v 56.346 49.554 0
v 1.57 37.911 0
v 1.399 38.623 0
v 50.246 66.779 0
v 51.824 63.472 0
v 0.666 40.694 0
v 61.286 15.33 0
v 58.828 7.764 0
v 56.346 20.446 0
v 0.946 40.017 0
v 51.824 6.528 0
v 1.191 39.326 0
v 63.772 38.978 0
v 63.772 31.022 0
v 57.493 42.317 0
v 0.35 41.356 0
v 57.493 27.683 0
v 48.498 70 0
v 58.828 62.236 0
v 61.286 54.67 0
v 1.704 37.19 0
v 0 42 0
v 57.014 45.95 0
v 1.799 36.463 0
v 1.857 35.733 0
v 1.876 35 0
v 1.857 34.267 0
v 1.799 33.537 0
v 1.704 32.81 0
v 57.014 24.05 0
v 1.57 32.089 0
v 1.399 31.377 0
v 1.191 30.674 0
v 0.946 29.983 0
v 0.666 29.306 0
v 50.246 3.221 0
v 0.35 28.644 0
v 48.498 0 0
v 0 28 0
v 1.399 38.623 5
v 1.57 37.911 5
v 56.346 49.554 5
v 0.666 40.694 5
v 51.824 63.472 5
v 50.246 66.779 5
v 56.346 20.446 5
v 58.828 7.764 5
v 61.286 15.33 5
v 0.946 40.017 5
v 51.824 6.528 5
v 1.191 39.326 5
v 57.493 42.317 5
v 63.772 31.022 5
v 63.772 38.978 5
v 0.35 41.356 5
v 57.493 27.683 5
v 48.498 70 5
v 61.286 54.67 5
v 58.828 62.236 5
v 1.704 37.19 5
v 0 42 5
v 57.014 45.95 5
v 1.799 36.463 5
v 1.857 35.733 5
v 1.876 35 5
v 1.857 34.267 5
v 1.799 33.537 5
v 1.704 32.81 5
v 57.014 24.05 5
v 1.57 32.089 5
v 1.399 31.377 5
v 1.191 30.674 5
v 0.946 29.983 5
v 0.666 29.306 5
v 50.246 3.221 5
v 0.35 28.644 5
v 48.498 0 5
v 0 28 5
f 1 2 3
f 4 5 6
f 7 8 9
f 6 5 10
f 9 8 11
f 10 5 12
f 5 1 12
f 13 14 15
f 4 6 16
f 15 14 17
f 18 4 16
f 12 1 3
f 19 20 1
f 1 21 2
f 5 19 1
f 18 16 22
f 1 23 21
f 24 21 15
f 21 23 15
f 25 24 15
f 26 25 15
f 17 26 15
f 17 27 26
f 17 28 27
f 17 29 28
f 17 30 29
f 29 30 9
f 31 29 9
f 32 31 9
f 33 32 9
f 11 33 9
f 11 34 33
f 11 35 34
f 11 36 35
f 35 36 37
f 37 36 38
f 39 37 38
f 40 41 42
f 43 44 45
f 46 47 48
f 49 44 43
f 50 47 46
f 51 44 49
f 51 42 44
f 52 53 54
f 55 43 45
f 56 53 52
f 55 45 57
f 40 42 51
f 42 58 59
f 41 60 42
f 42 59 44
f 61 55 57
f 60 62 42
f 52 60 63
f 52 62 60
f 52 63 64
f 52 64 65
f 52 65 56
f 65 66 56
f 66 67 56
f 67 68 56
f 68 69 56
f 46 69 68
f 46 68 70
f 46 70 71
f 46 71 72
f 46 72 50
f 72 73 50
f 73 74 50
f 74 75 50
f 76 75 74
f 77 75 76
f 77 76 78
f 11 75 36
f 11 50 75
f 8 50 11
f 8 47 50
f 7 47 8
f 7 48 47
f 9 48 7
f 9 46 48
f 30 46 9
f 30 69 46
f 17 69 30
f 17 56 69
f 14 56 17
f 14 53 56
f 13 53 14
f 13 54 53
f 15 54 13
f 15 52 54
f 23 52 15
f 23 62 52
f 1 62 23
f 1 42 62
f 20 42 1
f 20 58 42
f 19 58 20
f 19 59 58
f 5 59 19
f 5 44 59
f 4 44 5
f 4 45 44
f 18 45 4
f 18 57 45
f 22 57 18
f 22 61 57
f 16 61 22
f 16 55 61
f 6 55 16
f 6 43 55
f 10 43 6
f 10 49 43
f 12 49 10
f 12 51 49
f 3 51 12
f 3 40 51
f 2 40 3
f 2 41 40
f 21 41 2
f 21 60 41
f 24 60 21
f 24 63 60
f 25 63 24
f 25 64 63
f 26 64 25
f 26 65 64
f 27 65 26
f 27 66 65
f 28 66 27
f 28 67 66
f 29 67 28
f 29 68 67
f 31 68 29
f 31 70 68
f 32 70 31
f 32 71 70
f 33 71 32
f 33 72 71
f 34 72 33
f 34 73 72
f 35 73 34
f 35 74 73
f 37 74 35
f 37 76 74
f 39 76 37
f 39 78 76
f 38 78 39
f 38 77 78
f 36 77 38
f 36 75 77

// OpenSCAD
$fn = 32;

// ----------------------------------------------------------------------
// Gear sector: 3 teeth on 60 degrees
// ----------------------------------------------------------------------

// --- parameters (mm) ---
sector_angle = 60;        // sector angle, degrees
root_r = 70;              // root circle radius
tooth_h = 6;              // tooth height over the root circle
teeth = 3;                // number of teeth on the sector
hub_r = 14;               // hub bore radius
plate_t = 5;              // sector thickness, Z
arc_step = 3;             // sampling step of the root/hub arcs, degrees
fit_tol = 0.05;           // declared fit tolerance (prompt contract)
free_tol = 0.2;           // declared free tolerance (prompt contract)

tip_r = root_r + tooth_h;  // tip circle radius

profile = [[48.498, 0], [50.246, 3.221], [51.824, 6.528], [58.828, 7.764], [61.286, 15.33], [56.346, 20.446], [57.014, 24.05], [57.493, 27.683], [63.772, 31.022], [63.772, 38.978], [57.493, 42.317], [57.014, 45.95], [56.346, 49.554], [61.286, 54.67], [58.828, 62.236], [51.824, 63.472], [50.246, 66.779], [48.498, 70], [0, 42], [0.35, 41.356], [0.666, 40.694], [0.946, 40.017], [1.191, 39.326], [1.399, 38.623], [1.57, 37.911], [1.704, 37.19], [1.799, 36.463], [1.857, 35.733], [1.876, 35], [1.857, 34.267], [1.799, 33.537], [1.704, 32.81], [1.57, 32.089], [1.399, 31.377], [1.191, 30.674], [0.946, 29.983], [0.666, 29.306], [0.35, 28.644], [0, 28]];  // primary outline, 39 points, counter clockwise

// --- the one profile operation ---
linear_extrude(height = plate_t) polygon(points = profile);
